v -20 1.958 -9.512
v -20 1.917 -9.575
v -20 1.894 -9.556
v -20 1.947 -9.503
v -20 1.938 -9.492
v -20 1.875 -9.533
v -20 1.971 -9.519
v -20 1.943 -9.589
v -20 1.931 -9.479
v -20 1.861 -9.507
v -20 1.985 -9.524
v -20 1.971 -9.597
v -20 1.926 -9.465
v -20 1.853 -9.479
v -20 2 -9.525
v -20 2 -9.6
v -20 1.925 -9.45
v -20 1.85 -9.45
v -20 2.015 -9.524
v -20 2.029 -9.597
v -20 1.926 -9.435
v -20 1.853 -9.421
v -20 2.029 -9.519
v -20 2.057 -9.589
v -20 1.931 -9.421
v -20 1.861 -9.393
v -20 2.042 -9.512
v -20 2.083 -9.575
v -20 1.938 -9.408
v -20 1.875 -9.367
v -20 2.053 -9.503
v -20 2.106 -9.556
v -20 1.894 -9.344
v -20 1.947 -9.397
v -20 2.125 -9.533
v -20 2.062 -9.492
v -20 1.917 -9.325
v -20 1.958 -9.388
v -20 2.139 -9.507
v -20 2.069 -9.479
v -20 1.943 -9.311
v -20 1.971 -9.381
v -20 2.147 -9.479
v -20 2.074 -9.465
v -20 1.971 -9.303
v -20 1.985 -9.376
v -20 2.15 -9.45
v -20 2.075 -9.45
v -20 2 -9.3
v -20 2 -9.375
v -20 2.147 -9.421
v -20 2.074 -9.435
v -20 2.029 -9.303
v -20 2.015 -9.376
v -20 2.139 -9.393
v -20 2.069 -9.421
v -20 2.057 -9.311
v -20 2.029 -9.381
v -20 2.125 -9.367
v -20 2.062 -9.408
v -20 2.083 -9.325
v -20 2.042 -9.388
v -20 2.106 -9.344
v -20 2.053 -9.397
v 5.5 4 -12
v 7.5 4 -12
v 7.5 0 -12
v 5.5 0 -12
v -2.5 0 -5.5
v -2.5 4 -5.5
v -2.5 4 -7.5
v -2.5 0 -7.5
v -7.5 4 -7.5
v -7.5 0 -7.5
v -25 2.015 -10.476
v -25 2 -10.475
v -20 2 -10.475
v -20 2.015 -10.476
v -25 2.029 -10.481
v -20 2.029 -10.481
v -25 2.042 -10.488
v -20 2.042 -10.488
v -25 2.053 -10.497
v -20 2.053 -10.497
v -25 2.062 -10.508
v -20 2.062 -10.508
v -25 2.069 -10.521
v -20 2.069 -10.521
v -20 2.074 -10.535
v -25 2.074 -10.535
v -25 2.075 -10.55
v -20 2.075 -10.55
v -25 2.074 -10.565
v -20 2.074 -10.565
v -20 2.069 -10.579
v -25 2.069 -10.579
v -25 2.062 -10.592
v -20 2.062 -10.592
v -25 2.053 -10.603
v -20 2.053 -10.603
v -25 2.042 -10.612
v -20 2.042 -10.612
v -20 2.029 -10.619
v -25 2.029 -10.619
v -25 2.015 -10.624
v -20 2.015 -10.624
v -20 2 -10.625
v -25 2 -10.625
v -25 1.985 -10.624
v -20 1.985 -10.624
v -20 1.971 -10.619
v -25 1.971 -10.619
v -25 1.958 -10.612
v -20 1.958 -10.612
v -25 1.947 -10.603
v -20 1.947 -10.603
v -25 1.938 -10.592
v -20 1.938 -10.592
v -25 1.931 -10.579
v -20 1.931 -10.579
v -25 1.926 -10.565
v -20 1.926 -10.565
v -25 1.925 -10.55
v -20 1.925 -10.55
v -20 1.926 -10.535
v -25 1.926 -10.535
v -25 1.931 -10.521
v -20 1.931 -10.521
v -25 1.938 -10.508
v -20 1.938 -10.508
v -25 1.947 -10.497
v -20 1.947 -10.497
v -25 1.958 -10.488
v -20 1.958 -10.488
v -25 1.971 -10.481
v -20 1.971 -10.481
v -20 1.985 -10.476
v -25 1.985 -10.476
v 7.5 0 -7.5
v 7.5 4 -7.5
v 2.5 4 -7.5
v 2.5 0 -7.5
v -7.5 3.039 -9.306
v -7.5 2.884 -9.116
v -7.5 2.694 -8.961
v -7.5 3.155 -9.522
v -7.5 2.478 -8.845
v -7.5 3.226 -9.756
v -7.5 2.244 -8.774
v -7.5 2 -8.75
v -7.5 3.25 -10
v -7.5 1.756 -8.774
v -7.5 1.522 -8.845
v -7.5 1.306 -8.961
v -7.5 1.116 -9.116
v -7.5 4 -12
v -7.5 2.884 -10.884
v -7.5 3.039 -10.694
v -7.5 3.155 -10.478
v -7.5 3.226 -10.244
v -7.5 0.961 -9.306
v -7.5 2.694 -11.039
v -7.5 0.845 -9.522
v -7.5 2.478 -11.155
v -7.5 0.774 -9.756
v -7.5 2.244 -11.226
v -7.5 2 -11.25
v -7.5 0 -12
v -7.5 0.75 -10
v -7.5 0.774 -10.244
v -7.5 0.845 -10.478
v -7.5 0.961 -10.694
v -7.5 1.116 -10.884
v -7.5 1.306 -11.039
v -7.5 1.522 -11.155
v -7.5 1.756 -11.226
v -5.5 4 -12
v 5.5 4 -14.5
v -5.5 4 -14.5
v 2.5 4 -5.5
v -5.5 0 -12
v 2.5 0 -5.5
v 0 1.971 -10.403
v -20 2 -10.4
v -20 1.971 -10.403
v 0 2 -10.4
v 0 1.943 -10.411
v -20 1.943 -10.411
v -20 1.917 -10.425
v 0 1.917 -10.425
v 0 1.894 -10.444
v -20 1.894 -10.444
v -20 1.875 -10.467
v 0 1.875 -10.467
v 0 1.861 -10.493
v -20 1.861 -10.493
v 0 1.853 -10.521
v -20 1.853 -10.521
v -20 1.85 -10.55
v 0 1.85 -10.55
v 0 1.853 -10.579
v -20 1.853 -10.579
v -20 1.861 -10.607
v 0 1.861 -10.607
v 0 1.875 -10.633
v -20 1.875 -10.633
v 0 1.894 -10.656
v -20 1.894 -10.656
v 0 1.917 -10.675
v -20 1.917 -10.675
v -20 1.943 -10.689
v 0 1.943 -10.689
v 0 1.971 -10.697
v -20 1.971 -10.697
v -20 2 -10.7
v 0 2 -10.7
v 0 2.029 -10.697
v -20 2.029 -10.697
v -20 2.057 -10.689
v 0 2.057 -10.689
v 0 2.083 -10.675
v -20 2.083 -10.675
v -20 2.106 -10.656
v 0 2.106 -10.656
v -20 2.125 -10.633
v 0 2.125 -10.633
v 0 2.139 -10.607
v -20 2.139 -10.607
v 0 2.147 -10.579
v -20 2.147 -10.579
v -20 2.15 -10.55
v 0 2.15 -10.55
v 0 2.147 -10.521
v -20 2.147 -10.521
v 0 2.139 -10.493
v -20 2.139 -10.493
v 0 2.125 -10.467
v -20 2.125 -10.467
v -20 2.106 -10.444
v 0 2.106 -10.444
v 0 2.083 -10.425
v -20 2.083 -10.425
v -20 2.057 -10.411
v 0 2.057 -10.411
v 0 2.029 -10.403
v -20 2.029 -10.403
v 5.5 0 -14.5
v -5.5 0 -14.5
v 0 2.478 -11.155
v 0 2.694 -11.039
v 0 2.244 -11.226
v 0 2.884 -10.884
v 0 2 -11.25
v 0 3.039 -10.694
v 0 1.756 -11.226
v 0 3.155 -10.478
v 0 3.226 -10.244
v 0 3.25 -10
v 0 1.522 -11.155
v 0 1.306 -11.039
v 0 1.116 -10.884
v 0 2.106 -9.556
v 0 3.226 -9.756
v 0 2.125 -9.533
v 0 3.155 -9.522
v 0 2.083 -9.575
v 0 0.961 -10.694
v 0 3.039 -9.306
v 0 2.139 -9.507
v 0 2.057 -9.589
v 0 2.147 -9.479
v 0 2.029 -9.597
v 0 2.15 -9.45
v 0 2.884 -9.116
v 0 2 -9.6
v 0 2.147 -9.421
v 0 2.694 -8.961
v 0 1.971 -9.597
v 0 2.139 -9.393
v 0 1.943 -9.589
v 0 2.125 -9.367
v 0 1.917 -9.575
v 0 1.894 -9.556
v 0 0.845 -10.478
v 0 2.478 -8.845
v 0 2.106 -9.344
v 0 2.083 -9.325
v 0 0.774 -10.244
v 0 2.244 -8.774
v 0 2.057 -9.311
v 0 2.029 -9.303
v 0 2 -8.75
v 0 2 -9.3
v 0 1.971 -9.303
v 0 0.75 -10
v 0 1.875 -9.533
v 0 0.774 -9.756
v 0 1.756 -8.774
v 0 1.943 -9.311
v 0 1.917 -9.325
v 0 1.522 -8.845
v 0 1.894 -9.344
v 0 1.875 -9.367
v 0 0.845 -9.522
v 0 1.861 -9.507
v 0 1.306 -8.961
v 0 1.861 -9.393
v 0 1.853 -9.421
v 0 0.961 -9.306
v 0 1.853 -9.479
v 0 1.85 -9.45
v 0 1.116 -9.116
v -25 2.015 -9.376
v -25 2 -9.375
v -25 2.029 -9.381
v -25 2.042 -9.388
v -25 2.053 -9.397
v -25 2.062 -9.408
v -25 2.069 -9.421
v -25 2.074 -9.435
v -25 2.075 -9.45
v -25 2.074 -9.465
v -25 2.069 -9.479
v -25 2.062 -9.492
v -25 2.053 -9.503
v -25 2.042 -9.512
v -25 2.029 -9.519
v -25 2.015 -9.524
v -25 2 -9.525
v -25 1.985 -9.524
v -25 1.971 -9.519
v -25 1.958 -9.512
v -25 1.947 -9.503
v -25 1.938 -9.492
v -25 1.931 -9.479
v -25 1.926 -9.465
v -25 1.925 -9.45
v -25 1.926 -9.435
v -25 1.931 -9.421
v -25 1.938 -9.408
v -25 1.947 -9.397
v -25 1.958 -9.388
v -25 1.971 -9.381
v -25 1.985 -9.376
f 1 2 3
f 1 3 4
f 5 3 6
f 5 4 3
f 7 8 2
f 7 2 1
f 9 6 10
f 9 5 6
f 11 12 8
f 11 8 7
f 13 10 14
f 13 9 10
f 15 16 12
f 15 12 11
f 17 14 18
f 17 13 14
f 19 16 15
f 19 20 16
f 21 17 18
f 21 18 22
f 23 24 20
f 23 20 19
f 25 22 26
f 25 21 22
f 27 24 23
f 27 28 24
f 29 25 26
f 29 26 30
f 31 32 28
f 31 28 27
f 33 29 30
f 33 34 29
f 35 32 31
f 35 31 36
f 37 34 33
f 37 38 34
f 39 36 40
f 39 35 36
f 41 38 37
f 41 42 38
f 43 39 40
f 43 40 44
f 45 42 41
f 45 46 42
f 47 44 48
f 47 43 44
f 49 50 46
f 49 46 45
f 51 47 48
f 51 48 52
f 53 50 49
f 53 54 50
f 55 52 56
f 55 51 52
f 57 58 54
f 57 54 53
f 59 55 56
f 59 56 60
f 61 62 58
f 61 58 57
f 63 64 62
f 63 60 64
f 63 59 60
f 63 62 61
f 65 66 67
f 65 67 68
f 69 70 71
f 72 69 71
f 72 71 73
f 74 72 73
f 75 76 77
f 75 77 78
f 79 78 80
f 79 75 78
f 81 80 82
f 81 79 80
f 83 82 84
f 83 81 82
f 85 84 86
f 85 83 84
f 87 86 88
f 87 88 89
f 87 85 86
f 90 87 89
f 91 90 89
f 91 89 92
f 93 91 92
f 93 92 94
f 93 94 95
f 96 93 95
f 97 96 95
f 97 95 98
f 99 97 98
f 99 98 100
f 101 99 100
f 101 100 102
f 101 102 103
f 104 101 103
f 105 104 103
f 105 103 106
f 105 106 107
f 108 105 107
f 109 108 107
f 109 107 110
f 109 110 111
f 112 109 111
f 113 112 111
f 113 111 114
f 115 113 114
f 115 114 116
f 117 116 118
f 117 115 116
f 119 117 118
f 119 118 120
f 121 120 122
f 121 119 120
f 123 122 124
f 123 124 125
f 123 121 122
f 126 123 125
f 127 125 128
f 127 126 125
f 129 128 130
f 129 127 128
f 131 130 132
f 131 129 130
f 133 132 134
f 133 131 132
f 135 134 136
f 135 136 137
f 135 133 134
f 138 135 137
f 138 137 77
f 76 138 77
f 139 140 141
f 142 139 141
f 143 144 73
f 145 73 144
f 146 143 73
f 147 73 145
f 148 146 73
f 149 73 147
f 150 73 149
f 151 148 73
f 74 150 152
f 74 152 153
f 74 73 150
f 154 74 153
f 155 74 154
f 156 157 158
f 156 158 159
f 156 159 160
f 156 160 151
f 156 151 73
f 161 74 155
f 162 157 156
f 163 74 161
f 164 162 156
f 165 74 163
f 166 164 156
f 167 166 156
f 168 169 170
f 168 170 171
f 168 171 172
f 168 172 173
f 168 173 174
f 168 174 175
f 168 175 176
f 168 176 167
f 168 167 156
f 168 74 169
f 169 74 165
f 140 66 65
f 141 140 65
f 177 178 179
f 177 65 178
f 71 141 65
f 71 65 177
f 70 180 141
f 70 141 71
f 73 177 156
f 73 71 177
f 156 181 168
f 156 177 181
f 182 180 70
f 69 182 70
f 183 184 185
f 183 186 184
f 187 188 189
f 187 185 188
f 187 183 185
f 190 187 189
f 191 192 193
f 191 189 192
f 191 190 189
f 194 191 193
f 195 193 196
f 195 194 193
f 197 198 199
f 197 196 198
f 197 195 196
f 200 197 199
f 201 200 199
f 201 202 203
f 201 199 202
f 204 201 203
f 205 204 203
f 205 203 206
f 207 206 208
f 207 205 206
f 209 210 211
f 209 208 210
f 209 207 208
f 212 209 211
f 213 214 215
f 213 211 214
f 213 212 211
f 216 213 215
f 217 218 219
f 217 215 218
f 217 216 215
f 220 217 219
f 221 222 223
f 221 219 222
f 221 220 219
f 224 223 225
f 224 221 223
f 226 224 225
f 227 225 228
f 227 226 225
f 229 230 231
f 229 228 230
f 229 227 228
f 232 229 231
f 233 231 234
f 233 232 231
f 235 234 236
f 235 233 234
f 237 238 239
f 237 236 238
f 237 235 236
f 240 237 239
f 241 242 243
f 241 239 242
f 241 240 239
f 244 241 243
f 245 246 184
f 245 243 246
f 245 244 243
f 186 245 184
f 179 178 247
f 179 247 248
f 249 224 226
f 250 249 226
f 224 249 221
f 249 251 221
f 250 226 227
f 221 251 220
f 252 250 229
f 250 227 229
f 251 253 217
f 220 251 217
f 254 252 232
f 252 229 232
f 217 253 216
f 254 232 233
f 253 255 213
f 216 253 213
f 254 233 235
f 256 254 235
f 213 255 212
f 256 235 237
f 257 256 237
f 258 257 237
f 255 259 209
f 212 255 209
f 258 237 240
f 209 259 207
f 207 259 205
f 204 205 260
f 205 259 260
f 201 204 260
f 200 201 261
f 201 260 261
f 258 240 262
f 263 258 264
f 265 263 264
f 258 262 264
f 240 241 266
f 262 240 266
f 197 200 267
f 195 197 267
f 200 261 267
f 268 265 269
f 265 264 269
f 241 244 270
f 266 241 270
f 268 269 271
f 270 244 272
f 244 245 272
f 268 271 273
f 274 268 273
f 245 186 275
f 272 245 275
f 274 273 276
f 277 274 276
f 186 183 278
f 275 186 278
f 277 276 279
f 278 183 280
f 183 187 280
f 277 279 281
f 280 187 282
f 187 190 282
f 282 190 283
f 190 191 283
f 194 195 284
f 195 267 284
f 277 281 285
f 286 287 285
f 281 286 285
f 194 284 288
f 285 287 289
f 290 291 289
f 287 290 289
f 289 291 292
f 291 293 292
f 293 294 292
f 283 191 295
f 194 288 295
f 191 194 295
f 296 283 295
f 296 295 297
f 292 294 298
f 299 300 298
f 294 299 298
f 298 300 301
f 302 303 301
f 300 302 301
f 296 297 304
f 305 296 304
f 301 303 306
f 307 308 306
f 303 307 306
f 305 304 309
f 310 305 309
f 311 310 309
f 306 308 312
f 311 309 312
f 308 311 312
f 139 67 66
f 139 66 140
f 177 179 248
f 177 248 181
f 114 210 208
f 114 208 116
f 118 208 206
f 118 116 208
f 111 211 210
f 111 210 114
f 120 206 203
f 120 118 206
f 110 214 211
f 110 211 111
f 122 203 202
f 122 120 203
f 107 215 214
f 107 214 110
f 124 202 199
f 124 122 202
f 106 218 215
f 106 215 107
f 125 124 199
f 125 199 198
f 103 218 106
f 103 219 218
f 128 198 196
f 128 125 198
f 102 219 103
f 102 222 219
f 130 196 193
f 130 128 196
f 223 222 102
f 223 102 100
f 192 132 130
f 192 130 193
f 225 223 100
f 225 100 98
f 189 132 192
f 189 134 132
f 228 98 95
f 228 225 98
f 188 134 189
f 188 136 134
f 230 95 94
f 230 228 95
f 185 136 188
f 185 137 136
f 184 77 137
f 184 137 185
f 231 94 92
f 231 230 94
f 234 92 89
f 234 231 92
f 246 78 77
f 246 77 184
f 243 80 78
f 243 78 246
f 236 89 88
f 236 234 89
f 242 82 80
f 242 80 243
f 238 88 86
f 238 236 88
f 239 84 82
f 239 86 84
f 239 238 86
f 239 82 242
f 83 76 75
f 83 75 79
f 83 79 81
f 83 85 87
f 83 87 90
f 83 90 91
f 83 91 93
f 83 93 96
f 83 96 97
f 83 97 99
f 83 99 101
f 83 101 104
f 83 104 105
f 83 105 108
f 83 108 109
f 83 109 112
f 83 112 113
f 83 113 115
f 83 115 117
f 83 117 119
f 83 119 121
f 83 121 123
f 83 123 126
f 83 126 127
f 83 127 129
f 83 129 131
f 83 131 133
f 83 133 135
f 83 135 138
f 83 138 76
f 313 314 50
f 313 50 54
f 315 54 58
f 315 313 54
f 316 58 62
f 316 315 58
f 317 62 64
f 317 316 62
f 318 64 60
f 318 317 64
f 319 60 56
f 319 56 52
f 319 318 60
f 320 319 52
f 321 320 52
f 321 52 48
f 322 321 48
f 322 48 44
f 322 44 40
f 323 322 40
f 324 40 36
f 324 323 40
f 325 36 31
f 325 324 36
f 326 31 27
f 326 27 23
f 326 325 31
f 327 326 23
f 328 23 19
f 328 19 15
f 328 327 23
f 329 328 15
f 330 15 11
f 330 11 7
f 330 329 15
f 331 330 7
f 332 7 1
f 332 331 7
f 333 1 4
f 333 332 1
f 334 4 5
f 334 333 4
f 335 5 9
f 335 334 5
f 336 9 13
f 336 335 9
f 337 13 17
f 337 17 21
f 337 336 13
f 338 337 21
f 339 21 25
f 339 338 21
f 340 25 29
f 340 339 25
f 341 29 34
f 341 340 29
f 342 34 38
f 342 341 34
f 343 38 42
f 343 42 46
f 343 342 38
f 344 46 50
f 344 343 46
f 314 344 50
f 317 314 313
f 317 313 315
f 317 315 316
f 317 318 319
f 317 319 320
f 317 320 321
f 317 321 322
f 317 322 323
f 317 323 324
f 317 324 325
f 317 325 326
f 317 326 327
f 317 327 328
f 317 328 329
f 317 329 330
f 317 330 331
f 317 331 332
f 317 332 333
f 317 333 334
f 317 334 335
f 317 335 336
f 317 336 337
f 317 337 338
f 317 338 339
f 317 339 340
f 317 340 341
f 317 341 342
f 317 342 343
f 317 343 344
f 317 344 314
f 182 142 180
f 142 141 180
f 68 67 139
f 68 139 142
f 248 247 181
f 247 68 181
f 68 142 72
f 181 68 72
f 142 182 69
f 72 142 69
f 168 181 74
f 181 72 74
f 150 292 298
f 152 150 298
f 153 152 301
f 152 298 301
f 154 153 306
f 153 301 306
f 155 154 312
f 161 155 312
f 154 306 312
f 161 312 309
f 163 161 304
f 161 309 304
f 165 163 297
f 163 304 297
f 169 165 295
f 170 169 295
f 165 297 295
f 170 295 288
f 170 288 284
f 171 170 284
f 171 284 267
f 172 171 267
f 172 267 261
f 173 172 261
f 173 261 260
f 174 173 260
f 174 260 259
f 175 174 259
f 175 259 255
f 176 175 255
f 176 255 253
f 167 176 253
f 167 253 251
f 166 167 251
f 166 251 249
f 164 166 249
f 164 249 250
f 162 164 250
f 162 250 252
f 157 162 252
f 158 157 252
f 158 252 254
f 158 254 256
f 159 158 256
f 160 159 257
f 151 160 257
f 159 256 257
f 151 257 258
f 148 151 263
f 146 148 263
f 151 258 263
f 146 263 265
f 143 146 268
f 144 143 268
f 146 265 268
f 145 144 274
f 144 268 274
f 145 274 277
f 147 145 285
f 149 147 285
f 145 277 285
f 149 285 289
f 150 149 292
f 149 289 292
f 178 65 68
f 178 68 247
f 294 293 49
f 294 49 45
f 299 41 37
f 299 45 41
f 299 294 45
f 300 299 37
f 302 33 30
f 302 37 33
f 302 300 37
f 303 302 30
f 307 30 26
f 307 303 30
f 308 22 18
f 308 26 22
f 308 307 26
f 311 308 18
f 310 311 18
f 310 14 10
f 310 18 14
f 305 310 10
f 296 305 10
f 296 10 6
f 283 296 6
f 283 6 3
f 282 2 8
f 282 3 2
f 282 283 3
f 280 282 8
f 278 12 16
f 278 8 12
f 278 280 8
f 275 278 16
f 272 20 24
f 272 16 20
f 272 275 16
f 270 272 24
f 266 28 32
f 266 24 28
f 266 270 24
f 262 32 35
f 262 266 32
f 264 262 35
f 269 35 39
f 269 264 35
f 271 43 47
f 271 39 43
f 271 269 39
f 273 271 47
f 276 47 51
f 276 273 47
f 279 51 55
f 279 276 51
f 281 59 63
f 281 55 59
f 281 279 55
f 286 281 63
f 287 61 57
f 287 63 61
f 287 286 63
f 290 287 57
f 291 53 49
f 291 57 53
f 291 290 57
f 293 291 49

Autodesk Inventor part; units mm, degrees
ref_plane "YZ Plane" through (0, 0, 0) normal (1, 0, 0) x (0, 1, 0)
ref_plane "XZ Plane" through (0, 0, 0) normal (0, 1, 0) x (-1, 0, 0)
ref_plane "XY Plane" through (0, 0, 0) normal (0, 0, 1) x (1, 0, 0)
sketch "Sketch1" plane through (0, 0, 0) normal (0, 1, 0) x (-1, 0, 0)
  line L0 (-7.5, 15) -> (7.5, 15)
  line L1 (7.5, 15) -> (7.5, -15)
  line L2 (7.5, -15) -> (-7.5, -15)
  line L3 (-7.5, -15) -> (-7.5, 15)
  line L4 (-7.5, 15) -> (7.5, -15) construction
  line L5 (7.5, 15) -> (-7.5, -15) construction
  point P0 (0, 0)
  dimension "d0" = 15
  dimension "d1" = 30
extrude "Extrusion1" add sketch "Sketch1" along normal blind 4
chamfer "Chamfer1" distance 2.5 distance2 1 1 edges at (7.5, 2, -15) measured on face at (7.5, 1.3333, 5)
chamfer "Chamfer2" distance 1 distance2 2.5 1 edges at (-7.5, 2, -15) measured on face at (1.8333, 2.6667, -15)
sketch "Sketch3" plane through (0, 0, 0) normal (0, -1, 0) x (1, 0, 0)
  line L0 (0, 0) -> (4, 0)
  line L1 (0, 0) -> (-4, 0)
  dimension "d14" = 4
  dimension "d15" = 4
hole "Hole1" at (4, 0, 0) at (-4, 0, 0) direction (0, 1, 0) diameter 2.1565 end through all thread size "4-40 UNC" class "2B" standard "ANSI Unified Screw Threads"
sketch "Sketch4" plane through (0, 0, 0) normal (0, -1, 0) x (1, 0, 0)
  line L0 (7.5, 15) -> (7.5, -12.5) projected
  line L1 (7.5, -12.5) -> (7.5, -7.5)
  line L2 (7.5, -7.5) -> (2.5, -7.5)
  line L3 (2.5, -7.5) -> (2.5, -5.5)
  line L4 (2.5, -5.5) -> (-2.5, -5.5)
  line L5 (-2.5, -5.5) -> (-2.5, -7.5)
  line L6 (-2.5, -7.5) -> (-7.5679, -7.5)
  line L7 (-7.5679, -7.5) -> (-7.5679, -12.5)
  line L8 (6.5, -15) -> (-6.5, -15) projected
  line L9 (-7.5679, -12.5) -> (-6.5, -15)
  line L10 (7.5, -12.5) -> (6.5, -15) projected
  line L11 (-6.5, -15) -> (6.5, -15)
  line L12 (6.5, -15) -> (7.5, -12.5)
  point P0 (0, 0)
  dimension "d23" = 5
  dimension "d24" = 5
  dimension "d25" = 2
  dimension "d26" = 5
split body "Split1" sketch "Sketch4" result one side removed curves L2 L3 L4 L5 L6 L7 L9 L11 L12 L1 removed pieces at (1.1663, 0.5, 10.3182)
sketch "Sketch5" plane through (-7.5, 0, -12.5) normal (-1, 0, 0) x (0, 0, 1)
  line L0 (0, 0) -> (0, 4) projected
  line L1 (-2.5, 4) -> (-2.5, 0) projected
  line L2 (0, 0) -> (-2.5, 0)
  line L3 (-2.5, 0) -> (-2.5, 4)
  line L4 (-2.5, 4) -> (0, 4)
  line L5 (0, 4) -> (0, 0)
  point P0 (12.5, 0)
extrude "Extrusion3" cut sketch "Sketch5" against normal blind 2
sketch "Sketch6" plane through (7.5, 0, -12.5) normal (1, 0, 0) x (0, 0, -1)
  line L0 (0, 4) -> (0, 0) projected
  line L1 (2.5, 0) -> (2.5, 4) projected
  line L2 (0, 4) -> (2.5, 4)
  line L3 (2.5, 4) -> (2.5, 0)
  line L4 (2.5, 0) -> (0, 0)
  line L5 (0, 0) -> (0, 4)
  point P0 (-12.5, 0)
extrude "Extrusion4" cut sketch "Sketch6" against normal blind 2
hole "Hole2" at (-7.5, 2, -10) direction (1, 0, 0) diameter 2.5 depth 7.5
sketch "Sketch7" plane through (-7.5, 0, -12.5) normal (0, 0, -1) x (-1, 0, 0)
  line L0 (0, 0) -> (0, 4) projected
  line L1 (-2, 4) -> (0, 4) projected
  line L2 (-2, 4) -> (-2, 0) projected
  line L3 (0, 0) -> (-2, 0) projected
  point P0 (-7.5, 0)
extrude "Extrusion5" cut sketch "Sketch7" against normal blind 0.5
sketch "Sketch8" plane through (7.5, 0, -12.5) normal (0, 0, -1) x (-1, 0, 0)
  line L0 (2, 0) -> (0, 0) projected
  line L1 (0, 4) -> (0, 0) projected
  line L2 (2, 0) -> (0, 0) projected
  line L3 (2, 0) -> (2, 4) projected
  line L4 (0, 4) -> (2, 4) projected
  point P0 (7.5, 0)
extrude "Extrusion6" cut sketch "Sketch8" against normal blind 0.5
sketch "Sketch9" plane through (-5.5, 0, -12.5) normal (-1, 0, 0) x (0, 0, 1)
  line L0 (-2.5, 0) -> (-2.5, 4) projected
  line L1 (-2.5, 2) -> (-1.013, 2)
  point P0 (12.5, 0)
  dimension "d44" = 1.487
hole "Hole3" [suppressed]
sketch "Sketch10" plane through (5.5, 0, -12.5) normal (1, 0, 0) x (0, 0, -1)
  circle A0 centre (1.013, 2) radius 0.5953 projected
  point P0 (-12.5, 0)
hole "Hole4" [suppressed]
sketch "Sketch11" plane through (-5.5, 0, -15) normal (0, 0, -1) x (-1, 0, 0)
  line L0 (-11, 4) -> (-11, 0) projected
  line L1 (-11, 0) -> (0, 0) projected
  line L2 (-11, 4) -> (0, 4)
  line L3 (0, 4) -> (0, 0)
  line L4 (0, 0) -> (-11, 0)
  line L5 (-11, 0) -> (-11, 4)
  point P0 (-5.5, 0)
extrude "Extrusion7" cut sketch "Sketch11" against normal blind 0.5
sketch "Sketch12" plane through (0, 2, -10) normal (-1, 0, 0) x (0, 0, 1)
  circle A0 centre (-0.55, 0) radius 0.15
  circle A1 centre (0.55, 0) radius 0.15
  point P0 (10, -2)
  dimension "d63" = 0.3
  dimension "d64" = 0.3
extrude "Extrusion8" add sketch "Sketch12" along normal blind 25
sketch "Sketch13" plane through (-25, 2, -10.55) normal (-1, 0, 0) x (0, 0, 1)
  circle A0 centre (0, 0) radius 0.15 projected
  circle A1 centre (0, 0) radius 0.075
  circle A2 centre (1.1, 0) radius 0.15 projected
  circle A3 centre (1.1, 0) radius 0.075
  circle A4 centre (0, 0) radius 0.15 projected
  circle A5 centre (1.1, 0) radius 0.15 projected
  point P0 (10.55, -2)
  dimension "d67" = 0.15
  dimension "d68" = 0.15
extrude "Extrusion9" cut sketch "Sketch13" against normal blind 5
properties part number "AlN_thermal_contact" material "Copper"
